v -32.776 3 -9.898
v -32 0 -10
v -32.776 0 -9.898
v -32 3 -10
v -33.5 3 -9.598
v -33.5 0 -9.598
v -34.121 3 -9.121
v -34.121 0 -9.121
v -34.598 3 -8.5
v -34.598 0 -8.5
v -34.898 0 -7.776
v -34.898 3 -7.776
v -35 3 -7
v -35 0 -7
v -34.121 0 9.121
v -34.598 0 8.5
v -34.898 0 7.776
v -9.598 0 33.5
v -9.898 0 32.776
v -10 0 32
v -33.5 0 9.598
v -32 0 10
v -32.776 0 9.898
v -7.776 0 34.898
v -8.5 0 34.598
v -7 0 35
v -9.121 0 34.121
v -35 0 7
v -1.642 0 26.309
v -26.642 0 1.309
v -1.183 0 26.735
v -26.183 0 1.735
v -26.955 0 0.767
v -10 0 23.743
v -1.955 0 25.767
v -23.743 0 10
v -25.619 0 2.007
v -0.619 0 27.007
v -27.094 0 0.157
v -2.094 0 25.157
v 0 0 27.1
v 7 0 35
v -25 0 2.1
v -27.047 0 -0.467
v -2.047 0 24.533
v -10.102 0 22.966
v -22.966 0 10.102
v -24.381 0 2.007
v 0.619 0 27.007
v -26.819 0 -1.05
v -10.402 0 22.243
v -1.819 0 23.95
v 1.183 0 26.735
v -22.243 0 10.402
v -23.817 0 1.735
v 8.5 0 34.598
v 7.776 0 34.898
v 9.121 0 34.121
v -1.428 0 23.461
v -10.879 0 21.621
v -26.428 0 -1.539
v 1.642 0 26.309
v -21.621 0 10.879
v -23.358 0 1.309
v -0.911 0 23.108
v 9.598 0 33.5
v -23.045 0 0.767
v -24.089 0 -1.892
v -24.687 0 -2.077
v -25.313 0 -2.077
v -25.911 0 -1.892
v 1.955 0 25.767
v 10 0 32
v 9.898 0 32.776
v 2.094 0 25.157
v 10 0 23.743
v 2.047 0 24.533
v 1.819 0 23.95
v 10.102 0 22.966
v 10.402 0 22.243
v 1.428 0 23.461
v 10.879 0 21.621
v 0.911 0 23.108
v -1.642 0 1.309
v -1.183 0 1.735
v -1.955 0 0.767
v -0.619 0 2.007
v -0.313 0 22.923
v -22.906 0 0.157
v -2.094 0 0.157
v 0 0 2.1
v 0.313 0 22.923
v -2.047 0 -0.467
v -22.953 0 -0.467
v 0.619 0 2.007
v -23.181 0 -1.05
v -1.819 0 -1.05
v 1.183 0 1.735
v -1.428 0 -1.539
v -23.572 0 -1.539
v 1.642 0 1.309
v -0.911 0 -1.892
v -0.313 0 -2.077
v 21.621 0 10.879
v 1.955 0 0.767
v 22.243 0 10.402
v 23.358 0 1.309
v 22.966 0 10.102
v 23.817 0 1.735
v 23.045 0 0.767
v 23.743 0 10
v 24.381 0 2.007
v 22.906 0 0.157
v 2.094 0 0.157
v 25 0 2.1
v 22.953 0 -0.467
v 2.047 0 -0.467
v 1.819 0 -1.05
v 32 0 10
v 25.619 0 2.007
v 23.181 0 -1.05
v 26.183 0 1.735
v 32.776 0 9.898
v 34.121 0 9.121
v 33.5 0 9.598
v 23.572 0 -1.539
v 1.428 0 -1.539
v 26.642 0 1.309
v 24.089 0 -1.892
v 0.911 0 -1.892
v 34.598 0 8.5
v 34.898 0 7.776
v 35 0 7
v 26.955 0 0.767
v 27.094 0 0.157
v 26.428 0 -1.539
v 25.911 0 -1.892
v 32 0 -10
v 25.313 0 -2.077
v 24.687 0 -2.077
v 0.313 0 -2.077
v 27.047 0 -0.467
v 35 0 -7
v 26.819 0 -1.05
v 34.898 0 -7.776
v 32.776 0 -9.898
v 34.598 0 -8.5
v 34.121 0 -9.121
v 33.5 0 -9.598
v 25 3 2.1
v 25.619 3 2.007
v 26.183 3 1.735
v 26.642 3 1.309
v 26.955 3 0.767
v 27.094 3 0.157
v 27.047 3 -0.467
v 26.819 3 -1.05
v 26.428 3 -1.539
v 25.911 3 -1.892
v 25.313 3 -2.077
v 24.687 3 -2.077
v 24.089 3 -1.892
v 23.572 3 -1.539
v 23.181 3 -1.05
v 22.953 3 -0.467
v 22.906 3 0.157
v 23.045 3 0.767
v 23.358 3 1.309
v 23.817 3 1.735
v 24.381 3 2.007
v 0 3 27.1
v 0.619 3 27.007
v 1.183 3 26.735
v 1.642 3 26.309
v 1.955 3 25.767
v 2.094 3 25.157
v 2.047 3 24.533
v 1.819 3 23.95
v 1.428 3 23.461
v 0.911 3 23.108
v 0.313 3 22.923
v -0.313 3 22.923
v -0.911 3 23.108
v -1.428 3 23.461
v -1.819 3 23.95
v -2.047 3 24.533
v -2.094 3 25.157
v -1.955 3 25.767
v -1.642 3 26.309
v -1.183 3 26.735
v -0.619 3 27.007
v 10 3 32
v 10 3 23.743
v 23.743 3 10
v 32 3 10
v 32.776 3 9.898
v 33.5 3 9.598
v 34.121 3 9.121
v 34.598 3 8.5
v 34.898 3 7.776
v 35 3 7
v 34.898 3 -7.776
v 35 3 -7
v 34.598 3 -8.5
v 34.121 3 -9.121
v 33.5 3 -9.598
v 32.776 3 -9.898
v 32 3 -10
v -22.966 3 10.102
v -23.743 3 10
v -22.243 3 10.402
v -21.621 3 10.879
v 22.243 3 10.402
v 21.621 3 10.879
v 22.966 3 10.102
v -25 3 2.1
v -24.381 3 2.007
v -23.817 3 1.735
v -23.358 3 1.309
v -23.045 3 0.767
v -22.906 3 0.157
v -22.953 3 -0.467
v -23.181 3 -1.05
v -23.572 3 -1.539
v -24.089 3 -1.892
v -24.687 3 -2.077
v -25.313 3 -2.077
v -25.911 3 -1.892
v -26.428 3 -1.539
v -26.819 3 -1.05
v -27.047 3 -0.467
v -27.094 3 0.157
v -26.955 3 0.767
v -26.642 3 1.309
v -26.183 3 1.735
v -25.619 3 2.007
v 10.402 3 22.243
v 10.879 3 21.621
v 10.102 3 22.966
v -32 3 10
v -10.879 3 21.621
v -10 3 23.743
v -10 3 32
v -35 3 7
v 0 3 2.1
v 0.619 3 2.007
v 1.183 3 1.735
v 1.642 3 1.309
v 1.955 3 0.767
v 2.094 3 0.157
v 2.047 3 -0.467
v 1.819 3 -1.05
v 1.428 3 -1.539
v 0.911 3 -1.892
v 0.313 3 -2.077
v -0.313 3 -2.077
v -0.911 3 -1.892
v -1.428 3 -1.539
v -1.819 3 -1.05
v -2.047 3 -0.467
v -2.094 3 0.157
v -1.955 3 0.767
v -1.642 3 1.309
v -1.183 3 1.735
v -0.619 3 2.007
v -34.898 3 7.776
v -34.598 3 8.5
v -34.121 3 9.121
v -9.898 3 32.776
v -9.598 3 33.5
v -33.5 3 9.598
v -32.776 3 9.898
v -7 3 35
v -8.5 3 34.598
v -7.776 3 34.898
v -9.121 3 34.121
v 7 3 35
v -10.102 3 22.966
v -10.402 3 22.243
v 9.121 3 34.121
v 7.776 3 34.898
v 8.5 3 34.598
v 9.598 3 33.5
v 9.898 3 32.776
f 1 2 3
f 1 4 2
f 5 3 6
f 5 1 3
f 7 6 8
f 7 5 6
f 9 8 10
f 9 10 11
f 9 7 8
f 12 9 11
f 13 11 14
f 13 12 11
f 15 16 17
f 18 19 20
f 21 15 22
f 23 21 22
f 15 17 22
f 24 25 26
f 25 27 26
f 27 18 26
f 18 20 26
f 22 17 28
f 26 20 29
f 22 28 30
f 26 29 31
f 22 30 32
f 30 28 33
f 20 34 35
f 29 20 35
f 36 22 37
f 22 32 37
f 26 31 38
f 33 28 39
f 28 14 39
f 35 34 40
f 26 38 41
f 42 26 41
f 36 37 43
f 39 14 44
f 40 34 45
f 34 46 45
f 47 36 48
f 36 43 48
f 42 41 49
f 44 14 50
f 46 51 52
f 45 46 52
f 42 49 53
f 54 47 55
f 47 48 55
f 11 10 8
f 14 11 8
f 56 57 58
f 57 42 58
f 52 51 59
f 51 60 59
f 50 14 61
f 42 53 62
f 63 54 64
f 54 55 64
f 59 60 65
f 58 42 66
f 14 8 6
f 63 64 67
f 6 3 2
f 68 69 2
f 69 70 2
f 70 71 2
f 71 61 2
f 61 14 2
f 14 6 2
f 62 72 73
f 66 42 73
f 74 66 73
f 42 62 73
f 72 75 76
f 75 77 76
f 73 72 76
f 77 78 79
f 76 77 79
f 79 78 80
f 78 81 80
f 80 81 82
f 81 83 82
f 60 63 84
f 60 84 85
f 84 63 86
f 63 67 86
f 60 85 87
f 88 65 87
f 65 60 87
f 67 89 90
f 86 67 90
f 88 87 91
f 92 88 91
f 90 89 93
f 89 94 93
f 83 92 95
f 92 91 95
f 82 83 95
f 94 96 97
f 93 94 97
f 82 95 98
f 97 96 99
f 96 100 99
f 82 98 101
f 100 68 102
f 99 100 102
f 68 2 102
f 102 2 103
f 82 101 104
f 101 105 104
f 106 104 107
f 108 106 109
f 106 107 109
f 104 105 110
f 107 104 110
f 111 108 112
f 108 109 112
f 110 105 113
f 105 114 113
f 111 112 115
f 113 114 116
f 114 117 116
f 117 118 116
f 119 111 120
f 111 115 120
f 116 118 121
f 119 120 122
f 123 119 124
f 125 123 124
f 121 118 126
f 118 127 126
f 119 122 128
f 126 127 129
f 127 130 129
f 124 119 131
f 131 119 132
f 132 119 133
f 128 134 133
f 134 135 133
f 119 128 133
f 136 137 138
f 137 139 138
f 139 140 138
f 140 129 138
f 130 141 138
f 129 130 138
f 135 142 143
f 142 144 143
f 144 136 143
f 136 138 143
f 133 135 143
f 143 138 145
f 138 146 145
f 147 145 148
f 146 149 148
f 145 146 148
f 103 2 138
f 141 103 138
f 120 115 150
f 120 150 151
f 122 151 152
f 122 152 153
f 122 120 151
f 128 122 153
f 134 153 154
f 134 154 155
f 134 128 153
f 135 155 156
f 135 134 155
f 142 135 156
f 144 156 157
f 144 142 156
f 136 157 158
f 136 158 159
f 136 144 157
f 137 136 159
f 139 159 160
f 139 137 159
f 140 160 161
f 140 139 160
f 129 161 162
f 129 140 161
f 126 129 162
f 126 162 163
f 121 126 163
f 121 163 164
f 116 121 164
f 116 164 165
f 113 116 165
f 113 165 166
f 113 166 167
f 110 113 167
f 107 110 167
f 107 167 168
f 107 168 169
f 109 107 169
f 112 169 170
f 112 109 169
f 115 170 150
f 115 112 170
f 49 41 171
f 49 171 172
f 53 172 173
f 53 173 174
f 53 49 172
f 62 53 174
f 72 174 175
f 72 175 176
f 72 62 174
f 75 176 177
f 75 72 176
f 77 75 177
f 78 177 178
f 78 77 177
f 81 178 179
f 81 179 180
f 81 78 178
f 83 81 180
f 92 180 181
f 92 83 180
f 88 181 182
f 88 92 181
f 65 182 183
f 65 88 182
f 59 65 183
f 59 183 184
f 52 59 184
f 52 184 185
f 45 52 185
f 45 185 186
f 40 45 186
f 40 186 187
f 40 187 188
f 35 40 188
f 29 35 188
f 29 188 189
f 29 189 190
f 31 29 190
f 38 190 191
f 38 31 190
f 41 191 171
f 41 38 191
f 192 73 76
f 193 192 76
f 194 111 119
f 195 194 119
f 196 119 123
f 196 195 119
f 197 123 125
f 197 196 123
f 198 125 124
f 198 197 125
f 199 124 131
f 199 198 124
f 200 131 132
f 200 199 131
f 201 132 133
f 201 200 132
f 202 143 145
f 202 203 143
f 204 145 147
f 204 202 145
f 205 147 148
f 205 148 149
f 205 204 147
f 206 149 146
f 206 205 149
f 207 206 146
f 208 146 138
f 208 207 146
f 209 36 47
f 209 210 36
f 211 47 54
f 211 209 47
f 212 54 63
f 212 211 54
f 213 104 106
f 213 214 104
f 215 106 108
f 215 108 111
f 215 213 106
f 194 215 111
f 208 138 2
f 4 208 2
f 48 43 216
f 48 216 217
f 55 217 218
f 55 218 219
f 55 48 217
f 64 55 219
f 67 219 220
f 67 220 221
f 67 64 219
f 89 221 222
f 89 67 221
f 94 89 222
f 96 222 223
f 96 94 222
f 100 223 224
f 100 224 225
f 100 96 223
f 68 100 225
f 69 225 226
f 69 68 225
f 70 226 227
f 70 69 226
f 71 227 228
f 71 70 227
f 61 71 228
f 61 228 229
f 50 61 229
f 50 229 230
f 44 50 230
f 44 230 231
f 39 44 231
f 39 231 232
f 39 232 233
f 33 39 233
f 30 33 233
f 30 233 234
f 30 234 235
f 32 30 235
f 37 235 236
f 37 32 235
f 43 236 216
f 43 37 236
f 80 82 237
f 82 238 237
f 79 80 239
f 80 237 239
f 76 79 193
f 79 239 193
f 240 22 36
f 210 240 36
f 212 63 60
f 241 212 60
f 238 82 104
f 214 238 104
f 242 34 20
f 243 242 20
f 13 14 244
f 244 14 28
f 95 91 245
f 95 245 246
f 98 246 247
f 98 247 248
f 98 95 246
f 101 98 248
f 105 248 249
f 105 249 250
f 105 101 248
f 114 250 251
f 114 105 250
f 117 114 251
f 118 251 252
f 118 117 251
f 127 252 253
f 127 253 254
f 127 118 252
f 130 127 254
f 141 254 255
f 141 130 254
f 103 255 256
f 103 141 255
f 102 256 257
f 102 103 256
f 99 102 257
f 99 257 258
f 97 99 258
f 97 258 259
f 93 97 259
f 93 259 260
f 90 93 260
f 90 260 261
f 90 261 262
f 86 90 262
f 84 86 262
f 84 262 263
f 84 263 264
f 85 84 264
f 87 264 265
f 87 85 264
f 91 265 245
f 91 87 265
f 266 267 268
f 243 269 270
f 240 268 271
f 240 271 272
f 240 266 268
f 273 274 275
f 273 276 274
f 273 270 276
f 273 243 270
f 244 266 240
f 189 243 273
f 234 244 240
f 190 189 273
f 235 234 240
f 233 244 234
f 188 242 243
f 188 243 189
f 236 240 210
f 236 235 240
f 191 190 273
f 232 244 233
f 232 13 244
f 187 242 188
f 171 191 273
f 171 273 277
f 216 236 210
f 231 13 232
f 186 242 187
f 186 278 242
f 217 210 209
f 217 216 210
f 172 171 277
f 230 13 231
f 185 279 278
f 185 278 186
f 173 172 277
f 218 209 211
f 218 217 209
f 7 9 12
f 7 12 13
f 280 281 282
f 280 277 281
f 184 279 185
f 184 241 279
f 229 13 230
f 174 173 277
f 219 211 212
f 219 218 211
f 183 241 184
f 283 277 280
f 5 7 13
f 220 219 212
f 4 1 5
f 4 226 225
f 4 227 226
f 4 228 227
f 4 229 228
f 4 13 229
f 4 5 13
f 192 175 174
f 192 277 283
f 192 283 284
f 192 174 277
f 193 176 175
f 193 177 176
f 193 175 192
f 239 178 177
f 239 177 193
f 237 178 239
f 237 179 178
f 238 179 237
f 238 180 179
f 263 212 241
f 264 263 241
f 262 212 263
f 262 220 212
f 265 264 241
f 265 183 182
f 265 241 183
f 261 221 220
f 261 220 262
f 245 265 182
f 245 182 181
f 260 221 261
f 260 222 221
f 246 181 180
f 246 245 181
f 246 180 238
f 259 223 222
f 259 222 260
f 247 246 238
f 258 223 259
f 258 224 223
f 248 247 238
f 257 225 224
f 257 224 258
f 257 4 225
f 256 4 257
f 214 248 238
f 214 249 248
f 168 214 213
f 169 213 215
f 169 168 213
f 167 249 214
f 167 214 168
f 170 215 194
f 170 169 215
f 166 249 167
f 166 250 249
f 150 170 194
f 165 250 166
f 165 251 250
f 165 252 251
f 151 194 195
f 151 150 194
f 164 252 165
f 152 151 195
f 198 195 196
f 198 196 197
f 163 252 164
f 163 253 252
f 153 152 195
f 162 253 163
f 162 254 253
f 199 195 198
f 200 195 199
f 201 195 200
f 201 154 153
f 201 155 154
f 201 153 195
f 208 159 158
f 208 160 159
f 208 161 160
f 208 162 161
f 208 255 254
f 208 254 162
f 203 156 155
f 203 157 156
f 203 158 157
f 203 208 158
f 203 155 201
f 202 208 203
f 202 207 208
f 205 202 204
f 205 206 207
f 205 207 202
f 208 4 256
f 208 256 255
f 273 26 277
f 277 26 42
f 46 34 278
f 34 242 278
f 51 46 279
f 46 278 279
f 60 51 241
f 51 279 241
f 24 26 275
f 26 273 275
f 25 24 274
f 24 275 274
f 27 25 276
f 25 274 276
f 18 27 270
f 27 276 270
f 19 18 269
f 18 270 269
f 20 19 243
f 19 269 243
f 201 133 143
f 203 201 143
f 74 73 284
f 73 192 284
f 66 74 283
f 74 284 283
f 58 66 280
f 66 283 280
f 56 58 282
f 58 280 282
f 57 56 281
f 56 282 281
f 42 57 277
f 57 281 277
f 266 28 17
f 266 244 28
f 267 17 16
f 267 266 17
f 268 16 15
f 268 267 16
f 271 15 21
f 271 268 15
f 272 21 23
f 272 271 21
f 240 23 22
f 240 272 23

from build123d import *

# Parameters (mm, degrees)
SKETCH_1_R      = 2.1
EXTRUDE_1_DEPTH = 3
FILLET_1_R      = 3


with BuildPart() as part:
    # 草图1 → 凸台-拉伸1 (new body)
    # profile 1 of 3: a face of its own
    with BuildSketch(Plane(origin=(0, 0, 0), x_dir=(1, 0, 0), z_dir=(0, 1, 0))):
        Polygon((35, -10), (35, 10), (-35, 10), (-35, -10), (-22.5, -10), (-10, -10), (-10, -22.5), (-10, -35), (10, -35), (10, -22.5), (10, -10), (22.5, -10), align=None)
        with Locations(Location((0, -25, 0), (0, 0, 270))):
            Circle(SKETCH_1_R, mode=Mode.SUBTRACT)
        with Locations(Location((-25, 0, 0), (0, 0, 270))):
            Circle(SKETCH_1_R, mode=Mode.SUBTRACT)
        with Locations(Location((0, 0, 0), (0, 0, 270))):
            Circle(SKETCH_1_R, mode=Mode.SUBTRACT)
        with Locations(Location((25, 0, 0), (0, 0, 270))):
            Circle(SKETCH_1_R, mode=Mode.SUBTRACT)
    # profile 2 of 3: a face of its own
    with BuildSketch(Plane(origin=(0, 0, 0), x_dir=(1, 0, 0), z_dir=(0, 1, 0))):
        Polygon((-10, -10), (-22.5, -10), (-10, -22.5), align=None)
    # profile 3 of 3: a face of its own
    with BuildSketch(Plane(origin=(0, 0, 0), x_dir=(1, 0, 0), z_dir=(0, 1, 0))):
        Polygon((10, -22.5), (22.5, -10), (10, -10), align=None)
    extrude(amount=EXTRUDE_1_DEPTH)

    # 圆角1
    fillet_1_edges = [part.edges().sort_by_distance(p)[0] for p in [
        (10, 1.5, 22.5),
        (10, 1.5, 35),
        (-10, 1.5, 35),
        (-10, 1.5, 22.5),
        (-22.5, 1.5, 10),
        (-35, 1.5, 10),
        (-35, 1.5, -10),
        (35, 1.5, -10),
        (35, 1.5, 10),
        (22.5, 1.5, 10),
    ]]
    fillet(fillet_1_edges, radius=FILLET_1_R)


solid = part.part
